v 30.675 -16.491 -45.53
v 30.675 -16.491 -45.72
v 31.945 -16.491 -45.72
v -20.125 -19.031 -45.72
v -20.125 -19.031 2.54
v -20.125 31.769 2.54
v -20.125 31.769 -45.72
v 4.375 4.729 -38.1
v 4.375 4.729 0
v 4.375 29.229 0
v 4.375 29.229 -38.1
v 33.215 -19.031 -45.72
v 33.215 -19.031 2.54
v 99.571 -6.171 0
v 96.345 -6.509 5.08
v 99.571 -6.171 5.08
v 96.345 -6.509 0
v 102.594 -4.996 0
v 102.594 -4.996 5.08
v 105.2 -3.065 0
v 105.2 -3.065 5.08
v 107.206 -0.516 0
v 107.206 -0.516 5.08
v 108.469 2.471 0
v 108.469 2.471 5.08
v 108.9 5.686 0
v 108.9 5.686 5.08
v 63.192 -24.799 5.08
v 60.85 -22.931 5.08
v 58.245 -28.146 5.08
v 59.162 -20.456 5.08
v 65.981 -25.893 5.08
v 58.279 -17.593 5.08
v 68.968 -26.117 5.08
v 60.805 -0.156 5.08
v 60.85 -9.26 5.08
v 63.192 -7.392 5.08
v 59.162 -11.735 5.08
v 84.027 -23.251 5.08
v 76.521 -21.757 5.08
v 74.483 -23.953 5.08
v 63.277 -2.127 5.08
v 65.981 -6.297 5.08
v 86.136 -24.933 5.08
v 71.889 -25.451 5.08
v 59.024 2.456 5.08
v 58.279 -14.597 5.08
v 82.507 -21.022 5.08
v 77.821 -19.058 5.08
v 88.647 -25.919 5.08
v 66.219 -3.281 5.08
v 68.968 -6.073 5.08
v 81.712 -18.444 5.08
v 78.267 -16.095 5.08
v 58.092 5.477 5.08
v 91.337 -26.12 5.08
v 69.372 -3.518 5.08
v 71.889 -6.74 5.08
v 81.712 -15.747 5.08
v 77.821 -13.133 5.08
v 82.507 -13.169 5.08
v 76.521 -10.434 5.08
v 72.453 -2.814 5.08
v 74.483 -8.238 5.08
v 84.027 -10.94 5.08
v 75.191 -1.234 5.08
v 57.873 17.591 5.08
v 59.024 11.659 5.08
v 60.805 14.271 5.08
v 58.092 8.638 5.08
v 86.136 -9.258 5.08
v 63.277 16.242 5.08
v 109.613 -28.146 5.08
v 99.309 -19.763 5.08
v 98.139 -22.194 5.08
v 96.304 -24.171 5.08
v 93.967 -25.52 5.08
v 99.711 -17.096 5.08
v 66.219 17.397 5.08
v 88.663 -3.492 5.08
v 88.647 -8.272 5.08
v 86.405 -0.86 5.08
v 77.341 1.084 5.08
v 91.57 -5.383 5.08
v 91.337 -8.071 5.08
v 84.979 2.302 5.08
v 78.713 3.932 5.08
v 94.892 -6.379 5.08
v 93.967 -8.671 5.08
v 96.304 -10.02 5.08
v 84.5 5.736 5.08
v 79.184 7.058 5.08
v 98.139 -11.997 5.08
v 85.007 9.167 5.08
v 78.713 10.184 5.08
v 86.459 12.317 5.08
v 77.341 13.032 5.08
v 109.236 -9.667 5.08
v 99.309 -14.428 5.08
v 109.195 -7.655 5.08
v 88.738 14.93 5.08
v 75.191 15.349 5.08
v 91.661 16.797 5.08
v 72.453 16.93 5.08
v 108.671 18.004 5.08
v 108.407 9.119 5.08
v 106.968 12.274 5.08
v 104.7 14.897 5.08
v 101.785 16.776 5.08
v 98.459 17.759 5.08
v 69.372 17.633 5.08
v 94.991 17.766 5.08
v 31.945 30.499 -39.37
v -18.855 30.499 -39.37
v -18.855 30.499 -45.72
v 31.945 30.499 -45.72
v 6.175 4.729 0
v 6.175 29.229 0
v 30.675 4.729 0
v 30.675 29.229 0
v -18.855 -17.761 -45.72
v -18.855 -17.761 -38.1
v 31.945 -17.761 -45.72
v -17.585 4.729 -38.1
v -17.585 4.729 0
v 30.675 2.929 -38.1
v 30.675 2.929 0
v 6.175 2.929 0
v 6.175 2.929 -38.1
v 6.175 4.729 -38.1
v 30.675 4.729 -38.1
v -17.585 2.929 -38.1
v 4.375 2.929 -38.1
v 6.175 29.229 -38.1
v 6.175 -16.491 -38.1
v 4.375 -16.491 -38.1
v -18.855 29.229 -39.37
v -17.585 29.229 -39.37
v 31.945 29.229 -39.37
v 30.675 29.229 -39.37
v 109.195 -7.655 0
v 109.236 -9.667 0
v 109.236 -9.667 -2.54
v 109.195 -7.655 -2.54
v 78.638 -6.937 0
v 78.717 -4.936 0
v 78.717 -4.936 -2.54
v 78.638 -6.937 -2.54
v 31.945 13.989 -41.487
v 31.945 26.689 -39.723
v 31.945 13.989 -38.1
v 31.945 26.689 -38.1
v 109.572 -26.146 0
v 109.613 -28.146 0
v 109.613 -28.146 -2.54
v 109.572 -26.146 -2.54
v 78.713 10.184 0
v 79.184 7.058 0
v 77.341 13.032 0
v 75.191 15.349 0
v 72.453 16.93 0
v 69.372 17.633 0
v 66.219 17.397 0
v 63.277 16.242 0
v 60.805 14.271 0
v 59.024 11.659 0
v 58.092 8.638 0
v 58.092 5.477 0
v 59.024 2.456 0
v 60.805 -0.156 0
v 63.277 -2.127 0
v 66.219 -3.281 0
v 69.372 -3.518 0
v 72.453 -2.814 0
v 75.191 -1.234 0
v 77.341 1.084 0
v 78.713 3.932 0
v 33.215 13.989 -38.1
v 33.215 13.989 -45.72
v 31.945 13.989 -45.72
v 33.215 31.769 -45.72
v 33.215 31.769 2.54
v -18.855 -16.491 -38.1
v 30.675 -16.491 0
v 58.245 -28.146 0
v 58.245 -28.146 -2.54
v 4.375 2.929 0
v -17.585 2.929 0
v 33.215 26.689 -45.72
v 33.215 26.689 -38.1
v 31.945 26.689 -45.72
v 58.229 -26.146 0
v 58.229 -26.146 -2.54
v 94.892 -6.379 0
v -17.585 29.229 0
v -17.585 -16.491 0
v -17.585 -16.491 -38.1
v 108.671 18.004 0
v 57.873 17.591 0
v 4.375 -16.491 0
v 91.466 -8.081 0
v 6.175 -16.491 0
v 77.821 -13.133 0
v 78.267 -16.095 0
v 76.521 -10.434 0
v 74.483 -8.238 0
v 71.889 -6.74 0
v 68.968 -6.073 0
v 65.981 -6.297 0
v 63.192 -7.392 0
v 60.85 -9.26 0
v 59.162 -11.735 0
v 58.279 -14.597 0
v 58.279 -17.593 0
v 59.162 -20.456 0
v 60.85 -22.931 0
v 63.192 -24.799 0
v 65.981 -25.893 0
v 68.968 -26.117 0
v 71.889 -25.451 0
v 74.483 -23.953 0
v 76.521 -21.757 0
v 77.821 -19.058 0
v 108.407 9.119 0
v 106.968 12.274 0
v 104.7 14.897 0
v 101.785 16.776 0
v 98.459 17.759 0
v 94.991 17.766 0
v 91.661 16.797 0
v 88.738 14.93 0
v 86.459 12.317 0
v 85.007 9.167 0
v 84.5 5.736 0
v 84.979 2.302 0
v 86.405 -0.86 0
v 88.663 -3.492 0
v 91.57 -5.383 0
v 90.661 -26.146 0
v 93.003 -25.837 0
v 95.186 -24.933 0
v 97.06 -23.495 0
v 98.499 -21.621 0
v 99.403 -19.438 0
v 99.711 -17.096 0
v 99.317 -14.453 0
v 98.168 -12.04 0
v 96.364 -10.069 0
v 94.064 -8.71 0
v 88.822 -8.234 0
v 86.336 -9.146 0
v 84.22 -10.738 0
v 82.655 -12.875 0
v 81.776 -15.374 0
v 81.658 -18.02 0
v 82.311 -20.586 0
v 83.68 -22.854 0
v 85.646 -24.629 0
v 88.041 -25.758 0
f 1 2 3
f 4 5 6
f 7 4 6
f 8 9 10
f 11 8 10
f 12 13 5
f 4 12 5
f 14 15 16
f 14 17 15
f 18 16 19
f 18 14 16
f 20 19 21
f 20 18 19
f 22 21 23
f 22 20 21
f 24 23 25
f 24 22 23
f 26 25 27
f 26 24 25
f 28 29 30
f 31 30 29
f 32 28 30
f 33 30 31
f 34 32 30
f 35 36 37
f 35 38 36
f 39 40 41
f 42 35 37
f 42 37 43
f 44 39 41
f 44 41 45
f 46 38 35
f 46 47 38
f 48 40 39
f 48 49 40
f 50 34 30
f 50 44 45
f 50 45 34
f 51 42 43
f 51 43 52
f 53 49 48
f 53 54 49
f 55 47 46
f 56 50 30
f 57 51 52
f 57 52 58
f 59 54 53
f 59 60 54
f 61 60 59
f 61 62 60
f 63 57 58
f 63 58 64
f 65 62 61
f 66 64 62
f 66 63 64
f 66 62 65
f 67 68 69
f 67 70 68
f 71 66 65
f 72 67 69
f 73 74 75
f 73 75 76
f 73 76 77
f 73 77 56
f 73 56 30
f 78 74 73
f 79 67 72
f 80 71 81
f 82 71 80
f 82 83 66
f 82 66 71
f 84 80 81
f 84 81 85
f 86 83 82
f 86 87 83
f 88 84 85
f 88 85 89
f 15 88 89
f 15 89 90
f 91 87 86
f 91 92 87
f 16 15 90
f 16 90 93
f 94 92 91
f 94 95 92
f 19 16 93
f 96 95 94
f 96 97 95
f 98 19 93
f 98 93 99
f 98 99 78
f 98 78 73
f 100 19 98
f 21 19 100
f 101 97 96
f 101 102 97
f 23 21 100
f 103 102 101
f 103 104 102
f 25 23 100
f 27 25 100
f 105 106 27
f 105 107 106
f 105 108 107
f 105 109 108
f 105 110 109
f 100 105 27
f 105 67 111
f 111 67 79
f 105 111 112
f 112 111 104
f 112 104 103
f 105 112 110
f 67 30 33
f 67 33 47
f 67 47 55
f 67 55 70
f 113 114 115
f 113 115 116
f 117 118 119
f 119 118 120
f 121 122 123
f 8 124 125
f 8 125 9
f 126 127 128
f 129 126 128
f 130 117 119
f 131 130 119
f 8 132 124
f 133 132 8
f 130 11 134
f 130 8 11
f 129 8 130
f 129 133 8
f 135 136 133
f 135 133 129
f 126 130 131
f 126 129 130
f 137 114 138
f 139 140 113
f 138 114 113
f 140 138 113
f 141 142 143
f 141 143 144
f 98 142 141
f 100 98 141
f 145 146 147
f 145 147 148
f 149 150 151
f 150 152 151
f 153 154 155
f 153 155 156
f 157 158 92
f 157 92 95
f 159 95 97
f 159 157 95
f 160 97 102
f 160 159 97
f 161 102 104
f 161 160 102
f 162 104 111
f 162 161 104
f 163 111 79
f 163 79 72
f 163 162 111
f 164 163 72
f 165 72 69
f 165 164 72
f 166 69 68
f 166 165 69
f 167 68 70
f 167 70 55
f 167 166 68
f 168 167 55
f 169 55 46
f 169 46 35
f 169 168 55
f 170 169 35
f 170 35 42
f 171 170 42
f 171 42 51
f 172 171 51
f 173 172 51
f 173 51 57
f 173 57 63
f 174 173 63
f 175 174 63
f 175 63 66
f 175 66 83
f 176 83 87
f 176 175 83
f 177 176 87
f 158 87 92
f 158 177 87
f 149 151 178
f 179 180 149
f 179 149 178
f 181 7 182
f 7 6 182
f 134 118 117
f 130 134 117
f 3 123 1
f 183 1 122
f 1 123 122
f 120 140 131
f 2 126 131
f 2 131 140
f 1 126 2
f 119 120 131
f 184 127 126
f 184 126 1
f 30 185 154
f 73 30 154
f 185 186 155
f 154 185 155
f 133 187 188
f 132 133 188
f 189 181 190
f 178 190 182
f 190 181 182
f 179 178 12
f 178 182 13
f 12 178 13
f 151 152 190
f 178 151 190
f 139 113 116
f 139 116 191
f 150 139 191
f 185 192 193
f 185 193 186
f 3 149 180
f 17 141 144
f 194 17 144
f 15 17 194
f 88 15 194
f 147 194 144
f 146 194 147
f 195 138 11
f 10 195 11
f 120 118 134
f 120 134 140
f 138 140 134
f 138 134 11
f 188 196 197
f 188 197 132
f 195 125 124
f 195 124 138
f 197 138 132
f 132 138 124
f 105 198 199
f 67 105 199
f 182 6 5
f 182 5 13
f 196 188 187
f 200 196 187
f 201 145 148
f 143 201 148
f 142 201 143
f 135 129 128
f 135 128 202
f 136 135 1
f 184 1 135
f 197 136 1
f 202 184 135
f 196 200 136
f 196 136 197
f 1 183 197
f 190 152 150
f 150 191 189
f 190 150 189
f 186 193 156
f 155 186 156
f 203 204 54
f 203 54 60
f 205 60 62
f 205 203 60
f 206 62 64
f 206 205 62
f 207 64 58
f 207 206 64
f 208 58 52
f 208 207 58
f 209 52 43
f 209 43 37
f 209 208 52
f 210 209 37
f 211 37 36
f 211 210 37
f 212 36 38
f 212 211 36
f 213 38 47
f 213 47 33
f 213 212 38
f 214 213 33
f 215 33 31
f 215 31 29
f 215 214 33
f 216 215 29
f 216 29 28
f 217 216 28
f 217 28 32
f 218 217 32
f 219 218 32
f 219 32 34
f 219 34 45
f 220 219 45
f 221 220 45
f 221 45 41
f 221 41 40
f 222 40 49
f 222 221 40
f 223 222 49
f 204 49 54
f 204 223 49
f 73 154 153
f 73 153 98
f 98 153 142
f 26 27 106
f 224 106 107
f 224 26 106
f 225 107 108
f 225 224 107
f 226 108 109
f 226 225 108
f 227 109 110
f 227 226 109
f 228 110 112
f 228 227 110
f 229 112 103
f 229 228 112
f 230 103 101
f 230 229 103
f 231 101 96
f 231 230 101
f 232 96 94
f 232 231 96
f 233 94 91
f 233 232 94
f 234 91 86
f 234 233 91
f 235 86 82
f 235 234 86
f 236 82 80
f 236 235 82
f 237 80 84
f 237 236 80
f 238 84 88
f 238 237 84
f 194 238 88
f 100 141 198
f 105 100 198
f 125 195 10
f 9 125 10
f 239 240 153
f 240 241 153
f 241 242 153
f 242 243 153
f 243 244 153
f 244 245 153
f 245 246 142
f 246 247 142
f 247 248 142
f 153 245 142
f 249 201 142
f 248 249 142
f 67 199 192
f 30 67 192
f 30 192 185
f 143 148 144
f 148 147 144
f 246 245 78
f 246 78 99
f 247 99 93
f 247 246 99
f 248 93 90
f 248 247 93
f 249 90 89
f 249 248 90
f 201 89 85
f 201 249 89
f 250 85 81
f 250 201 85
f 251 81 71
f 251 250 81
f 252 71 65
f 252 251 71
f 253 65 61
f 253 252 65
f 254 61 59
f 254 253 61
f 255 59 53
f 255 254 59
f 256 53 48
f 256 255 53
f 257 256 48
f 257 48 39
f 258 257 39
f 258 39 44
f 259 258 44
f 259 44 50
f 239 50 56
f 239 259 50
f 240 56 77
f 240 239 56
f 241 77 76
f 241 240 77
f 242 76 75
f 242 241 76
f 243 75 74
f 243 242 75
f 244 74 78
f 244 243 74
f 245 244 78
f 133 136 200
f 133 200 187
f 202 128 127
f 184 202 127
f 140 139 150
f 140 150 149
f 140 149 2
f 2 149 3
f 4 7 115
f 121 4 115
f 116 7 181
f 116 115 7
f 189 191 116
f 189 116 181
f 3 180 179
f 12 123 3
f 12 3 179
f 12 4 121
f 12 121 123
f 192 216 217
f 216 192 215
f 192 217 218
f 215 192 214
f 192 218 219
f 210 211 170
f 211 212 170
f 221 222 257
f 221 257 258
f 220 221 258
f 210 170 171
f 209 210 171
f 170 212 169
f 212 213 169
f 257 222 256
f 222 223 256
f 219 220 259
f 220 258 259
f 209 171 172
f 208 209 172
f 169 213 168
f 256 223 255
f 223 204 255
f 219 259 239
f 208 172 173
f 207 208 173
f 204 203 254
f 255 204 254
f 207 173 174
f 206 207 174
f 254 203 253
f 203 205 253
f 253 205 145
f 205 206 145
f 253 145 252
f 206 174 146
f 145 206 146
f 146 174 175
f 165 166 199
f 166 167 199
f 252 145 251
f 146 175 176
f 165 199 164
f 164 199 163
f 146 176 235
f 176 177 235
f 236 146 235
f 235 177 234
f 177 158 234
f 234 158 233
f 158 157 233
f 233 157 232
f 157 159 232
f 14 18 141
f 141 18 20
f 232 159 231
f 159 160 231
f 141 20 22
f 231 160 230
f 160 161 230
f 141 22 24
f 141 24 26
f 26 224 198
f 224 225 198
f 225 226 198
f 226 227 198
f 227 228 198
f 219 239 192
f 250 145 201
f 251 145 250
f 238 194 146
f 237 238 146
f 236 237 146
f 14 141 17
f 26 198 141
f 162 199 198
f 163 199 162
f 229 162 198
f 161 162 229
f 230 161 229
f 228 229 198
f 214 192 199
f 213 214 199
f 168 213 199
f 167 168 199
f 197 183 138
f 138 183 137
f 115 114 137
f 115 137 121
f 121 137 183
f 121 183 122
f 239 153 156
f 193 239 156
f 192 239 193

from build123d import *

# Parameters (mm, degrees)
F0_W      = 53.34
F0_H      = 50.8
F1_DEPTH  = 2.54
F2_W      = 50.8
F2_H      = 48.26
F3_DEPTH  = 45.72
F4_W      = 1.27
F4_H      = 12.7
F5_DEPTH  = 7.62
F6_W      = 50.8
F6_H      = 39.37
F7_DEPTH  = 1.27
F9_DEPTH  = 1.27
F11_DEPTH = 1.27
F13_DEPTH = 1.27
F15_DEPTH = 38.1
F16_R     = 10.05
F16_R_2   = 9.05
F16_R_3   = 10.605
F16_R_4   = 12.2
F17_DEPTH = 5.08
F19_DEPTH = 7.62


with BuildPart() as f1:
    # F0 (on Top) → F1 (new body)
    with BuildSketch(Plane.XY):
        with Locations((6.545385, 6.369493)):
            Rectangle(F0_W, F0_H)
    extrude(amount=F1_DEPTH)

    # F2 (on face) → F3 (join)
    with BuildSketch(Plane(origin=(0, 0, 0), x_dir=(1, 0, 0), z_dir=(0, 0, -1))):
        Polygon((-18.854615, 19.030507), (-20.124615, 19.030507), (-20.124615, -31.769493), (-18.854615, -31.769493), (31.945385, -31.769493), (33.215385, -31.769493), (33.215385, 19.030507), (31.945385, 19.030507), align=None)
        with Locations((6.545385, -6.369493)):
            Rectangle(F2_W, F2_H, mode=Mode.SUBTRACT)
    extrude(amount=F3_DEPTH)

    # F4 (on face) → F5 (cut)
    with BuildSketch(Plane(origin=(0, 0, -45.72), x_dir=(1, 0, 0), z_dir=(0, 0, -1))):
        with Locations((32.580385, -20.339493)):
            Rectangle(F4_W, F4_H)
    extrude(amount=-F5_DEPTH, mode=Mode.SUBTRACT)

    # F6 (on face) → F7 (join)
    with BuildSketch(Plane.XZ.offset(-30.499493)):
        with Locations((6.545385, -19.685)):
            Rectangle(F6_W, F6_H)
    extrude(amount=F7_DEPTH)

    # F8 (on face) → F9 (join)
    with BuildSketch(Plane(origin=(0, -17.760507, 0), x_dir=(-1, 0, 0), z_dir=(0, 1, 0))):
        Polygon((18.854615, -38.1), (18.854615, 0), (-31.945385, 0), (-31.945385, -45.72), align=None)
    extrude(amount=F9_DEPTH)

    # F10 (on face) → F11 (join)
    with BuildSketch(Plane(origin=(31.945385, 0, 0), x_dir=(0, -1, 0), z_dir=(-1, 0, 0))):
        Polygon((16.490507, -45.72), (16.490507, 0), (-29.229493, 0), (-29.229493, -39.37), align=None)
    extrude(amount=F11_DEPTH)

    # F12 (on face) → F13 (join)
    with BuildSketch(Plane.YZ.offset(-18.854615)):
        Polygon((29.229493, 0), (-16.490507, 0), (-16.490507, -38.1), (29.229493, -39.37), align=None)
    extrude(amount=F13_DEPTH)

    # F14 (on face) → F15 (join)
    with BuildSketch(Plane(origin=(0, 0, 0), x_dir=(1, 0, 0), z_dir=(0, 0, -1))):
        Polygon((4.375385, -29.229493), (6.175385, -29.229493), (6.175385, -4.729493), (30.675385, -4.729493), (30.675385, -2.929493), (6.175385, -2.929493), (6.175385, 16.490507), (4.375385, 16.490507), (4.375385, -2.929493), (-17.584615, -2.929493), (-17.584615, -4.729493), (4.375385, -4.729493), align=None)
    extrude(amount=F15_DEPTH)


with BuildPart() as f17:
    # F16 (on Top) → F17 (new body)
    with BuildSketch(Plane.XY):
        Polygon((57.873074, 17.590984), (58.244838, -28.145505), (109.612838, -28.145505), (108.671395, 18.003893), align=None)
        with Locations((68.217222, -16.095343)):
            Circle(F16_R, mode=Mode.SUBTRACT)
        with Locations((90.661085, -17.095505)):
            Circle(F16_R_2, mode=Mode.SUBTRACT)
        with Locations((68.579044, 7.057655)):
            Circle(F16_R_3, mode=Mode.SUBTRACT)
        with Locations((96.700133, 5.686182)):
            Circle(F16_R_4, mode=Mode.SUBTRACT)
    extrude(amount=F17_DEPTH)

    # F18 (on face) → F19 (join)
    with BuildSketch(Plane.XY.offset(5.08)):
        Polygon((58.228581, -26.145505), (58.244838, -28.145505), (109.612838, -28.145505), (109.572038, -26.145505), align=None)
        Polygon((78.637934, -6.936996), (109.23587, -9.666598), (109.194834, -7.654994), (78.717203, -4.936126), align=None)
    extrude(amount=-F19_DEPTH)


solid = Compound([f1.part, f17.part])
